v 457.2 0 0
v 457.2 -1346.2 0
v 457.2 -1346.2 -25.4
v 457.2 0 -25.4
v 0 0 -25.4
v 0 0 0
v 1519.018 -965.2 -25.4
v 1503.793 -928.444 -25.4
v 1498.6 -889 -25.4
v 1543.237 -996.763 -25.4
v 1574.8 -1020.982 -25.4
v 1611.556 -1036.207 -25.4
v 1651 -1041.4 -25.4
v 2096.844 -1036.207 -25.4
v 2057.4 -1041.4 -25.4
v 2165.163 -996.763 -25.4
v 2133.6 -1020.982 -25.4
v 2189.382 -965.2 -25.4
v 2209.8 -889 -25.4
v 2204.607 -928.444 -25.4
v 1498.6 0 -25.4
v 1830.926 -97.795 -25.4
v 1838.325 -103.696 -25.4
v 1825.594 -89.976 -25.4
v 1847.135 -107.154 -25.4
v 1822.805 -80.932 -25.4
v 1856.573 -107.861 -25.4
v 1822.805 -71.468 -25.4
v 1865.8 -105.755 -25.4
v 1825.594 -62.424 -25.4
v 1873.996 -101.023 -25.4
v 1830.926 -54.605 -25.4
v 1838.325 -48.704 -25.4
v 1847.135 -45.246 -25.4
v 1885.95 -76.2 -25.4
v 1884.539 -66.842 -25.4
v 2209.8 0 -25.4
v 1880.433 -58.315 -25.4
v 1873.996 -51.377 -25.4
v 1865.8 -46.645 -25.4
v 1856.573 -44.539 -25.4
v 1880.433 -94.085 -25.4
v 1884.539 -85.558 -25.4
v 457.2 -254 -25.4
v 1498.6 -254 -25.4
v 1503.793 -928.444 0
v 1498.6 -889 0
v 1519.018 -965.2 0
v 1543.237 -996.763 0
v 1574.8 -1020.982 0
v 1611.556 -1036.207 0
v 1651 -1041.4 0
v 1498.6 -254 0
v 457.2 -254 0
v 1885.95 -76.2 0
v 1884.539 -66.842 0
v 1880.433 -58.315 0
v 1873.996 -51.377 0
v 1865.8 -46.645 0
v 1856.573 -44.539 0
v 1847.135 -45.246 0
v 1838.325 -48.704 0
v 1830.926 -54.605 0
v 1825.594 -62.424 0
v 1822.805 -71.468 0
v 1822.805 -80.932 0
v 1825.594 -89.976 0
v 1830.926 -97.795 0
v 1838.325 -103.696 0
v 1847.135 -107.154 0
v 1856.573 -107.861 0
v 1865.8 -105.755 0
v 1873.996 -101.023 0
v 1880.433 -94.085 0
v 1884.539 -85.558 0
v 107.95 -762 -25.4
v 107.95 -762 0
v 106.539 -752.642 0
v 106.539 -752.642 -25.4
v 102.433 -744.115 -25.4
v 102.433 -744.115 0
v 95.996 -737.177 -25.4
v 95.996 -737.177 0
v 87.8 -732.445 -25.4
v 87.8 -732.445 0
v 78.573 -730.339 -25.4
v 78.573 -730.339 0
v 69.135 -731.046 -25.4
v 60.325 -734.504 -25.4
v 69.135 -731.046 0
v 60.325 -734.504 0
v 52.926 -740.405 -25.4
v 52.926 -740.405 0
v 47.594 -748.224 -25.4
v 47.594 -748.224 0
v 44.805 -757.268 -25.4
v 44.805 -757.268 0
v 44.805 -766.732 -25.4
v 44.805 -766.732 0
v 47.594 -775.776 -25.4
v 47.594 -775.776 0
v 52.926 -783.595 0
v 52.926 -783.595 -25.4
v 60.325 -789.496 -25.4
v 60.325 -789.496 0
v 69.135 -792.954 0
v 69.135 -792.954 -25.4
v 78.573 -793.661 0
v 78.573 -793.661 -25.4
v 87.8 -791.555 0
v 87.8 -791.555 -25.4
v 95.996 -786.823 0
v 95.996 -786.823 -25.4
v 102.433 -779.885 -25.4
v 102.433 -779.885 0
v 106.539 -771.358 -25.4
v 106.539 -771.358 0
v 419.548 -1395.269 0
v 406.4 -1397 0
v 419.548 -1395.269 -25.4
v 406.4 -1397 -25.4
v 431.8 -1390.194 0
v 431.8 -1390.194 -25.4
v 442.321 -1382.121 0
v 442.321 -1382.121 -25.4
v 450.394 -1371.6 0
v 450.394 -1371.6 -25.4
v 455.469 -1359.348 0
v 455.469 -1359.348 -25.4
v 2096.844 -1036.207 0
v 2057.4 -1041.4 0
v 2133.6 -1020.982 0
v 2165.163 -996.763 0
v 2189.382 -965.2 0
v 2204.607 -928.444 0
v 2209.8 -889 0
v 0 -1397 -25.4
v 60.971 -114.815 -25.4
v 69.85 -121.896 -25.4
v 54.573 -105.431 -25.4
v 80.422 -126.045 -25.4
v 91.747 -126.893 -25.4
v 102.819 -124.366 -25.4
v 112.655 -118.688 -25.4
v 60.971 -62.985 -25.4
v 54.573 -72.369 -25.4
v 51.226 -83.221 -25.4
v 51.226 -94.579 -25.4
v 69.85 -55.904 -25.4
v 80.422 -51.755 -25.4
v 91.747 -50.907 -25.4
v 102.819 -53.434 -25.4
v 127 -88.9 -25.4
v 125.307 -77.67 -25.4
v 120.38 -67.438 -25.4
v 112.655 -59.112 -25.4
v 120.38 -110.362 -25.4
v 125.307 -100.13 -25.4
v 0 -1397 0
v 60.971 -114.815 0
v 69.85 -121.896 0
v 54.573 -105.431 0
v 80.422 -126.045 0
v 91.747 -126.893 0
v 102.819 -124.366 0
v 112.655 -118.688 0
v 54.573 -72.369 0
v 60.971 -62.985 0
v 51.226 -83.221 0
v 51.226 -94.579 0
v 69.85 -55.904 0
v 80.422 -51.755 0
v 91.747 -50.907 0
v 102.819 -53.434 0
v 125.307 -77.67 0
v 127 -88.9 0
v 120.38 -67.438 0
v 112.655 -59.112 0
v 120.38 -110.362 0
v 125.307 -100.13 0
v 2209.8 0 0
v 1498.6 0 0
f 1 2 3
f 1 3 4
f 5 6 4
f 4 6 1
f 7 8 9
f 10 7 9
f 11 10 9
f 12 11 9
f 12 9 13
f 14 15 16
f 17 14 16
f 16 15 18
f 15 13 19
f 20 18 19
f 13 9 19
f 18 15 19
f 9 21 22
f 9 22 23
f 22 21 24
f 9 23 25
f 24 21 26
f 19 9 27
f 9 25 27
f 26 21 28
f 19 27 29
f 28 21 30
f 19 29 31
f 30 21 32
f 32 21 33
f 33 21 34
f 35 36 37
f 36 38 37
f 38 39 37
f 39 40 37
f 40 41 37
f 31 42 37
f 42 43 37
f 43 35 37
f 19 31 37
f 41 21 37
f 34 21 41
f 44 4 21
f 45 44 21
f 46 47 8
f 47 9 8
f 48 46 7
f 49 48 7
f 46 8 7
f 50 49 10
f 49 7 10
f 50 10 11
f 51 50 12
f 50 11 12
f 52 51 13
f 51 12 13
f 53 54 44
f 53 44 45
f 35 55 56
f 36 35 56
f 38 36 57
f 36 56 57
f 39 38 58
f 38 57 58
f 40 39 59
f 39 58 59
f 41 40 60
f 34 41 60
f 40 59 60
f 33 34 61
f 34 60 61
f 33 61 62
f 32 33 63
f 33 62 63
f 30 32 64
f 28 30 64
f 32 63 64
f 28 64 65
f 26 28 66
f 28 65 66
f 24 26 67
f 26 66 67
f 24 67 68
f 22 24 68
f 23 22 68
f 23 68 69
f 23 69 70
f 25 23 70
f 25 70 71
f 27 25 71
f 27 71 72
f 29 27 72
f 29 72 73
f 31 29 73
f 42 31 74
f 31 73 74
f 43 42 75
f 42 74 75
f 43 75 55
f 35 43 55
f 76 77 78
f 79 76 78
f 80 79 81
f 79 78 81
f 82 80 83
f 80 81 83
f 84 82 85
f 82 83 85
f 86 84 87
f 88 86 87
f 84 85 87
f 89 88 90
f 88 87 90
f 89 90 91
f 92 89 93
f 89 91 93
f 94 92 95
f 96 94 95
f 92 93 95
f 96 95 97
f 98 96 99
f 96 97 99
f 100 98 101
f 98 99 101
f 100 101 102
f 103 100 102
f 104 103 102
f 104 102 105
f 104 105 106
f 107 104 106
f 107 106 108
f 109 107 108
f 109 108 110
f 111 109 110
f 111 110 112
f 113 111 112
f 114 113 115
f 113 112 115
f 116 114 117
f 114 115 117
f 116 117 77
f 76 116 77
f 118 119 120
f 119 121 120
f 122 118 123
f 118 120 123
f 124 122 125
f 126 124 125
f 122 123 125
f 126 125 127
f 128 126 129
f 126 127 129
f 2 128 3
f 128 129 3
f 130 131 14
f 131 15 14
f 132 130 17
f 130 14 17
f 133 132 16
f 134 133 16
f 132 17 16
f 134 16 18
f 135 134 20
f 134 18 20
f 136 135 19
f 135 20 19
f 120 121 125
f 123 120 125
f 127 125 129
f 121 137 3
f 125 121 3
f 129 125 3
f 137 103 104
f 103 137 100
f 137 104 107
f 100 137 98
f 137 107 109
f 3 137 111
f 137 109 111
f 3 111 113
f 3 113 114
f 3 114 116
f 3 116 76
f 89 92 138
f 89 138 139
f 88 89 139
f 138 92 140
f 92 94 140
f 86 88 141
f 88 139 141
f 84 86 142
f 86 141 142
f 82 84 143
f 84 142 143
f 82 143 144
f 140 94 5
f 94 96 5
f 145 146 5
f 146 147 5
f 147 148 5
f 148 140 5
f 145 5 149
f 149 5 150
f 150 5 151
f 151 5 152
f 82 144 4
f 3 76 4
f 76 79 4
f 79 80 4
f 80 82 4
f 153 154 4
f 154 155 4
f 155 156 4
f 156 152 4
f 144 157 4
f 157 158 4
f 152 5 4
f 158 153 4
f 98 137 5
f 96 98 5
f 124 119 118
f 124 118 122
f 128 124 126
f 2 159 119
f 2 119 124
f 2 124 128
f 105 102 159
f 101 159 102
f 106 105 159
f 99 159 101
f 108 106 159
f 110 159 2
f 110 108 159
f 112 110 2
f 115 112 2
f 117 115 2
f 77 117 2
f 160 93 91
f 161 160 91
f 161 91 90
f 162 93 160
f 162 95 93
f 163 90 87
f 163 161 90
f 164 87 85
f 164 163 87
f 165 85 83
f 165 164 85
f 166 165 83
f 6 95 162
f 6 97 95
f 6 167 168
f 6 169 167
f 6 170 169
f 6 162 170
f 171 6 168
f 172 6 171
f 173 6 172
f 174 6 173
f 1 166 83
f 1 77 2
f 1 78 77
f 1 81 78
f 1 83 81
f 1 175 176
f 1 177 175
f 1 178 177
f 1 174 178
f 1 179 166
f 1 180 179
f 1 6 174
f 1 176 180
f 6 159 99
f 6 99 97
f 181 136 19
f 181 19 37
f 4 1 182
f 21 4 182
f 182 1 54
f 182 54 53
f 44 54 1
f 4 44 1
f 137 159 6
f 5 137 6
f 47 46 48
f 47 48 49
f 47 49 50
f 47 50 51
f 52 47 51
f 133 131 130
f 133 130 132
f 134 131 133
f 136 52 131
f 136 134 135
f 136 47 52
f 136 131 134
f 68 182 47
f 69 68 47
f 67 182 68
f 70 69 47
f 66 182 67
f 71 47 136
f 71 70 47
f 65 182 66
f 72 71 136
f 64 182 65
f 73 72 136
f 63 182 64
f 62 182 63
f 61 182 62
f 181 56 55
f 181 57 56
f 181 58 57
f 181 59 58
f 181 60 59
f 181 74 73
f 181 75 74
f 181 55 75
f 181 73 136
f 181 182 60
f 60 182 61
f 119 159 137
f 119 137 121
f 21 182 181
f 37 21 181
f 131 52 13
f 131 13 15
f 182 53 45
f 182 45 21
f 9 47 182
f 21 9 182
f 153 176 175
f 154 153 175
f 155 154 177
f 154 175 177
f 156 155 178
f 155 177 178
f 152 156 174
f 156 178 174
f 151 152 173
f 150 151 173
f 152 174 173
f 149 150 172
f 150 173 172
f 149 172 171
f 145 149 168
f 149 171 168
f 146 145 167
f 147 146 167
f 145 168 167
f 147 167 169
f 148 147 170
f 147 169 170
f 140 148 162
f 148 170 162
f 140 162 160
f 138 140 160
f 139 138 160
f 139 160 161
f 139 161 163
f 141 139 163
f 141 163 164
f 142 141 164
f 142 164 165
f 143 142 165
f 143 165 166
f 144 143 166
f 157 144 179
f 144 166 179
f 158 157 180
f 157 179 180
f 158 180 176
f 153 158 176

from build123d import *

# Parameters (mm, degrees)
F0_W     = 457.2
F0_H     = 1397
F1_DEPTH = 25.4
F2_W     = 1041.4
F2_H     = 254
F3_DEPTH = 25.4
F4_W     = 711.2
F4_H     = 1041.4
F5_DEPTH = 25.4
F6_R     = 50.8
F7_R     = 152.4
F8_R     = 38.1
F8_R_2   = 31.75
F9_DEPTH = 25.4


with BuildPart() as f1:
    # F0 (on Top) → F1 (new body)
    with BuildSketch(Plane.XY):
        with Locations((228.6, -698.5)):
            Rectangle(F0_W, F0_H)
    extrude(amount=-F1_DEPTH)

    # F6
    f6_edges = [f1.edges().sort_by_distance(p)[0] for p in [
        (457.2, -1397, -12.7),
    ]]
    fillet(f6_edges, radius=F6_R)


with BuildPart() as f3:
    # F2 (on Top) → F3 (new body)
    with BuildSketch(Plane.XY):
        with Locations((977.9, -127)):
            Rectangle(F2_W, F2_H)
    extrude(amount=-F3_DEPTH)


with BuildPart() as f5:
    # F4 (on Top) → F5 (new body)
    with BuildSketch(Plane.XY):
        with Locations((1854.2, -520.7)):
            Rectangle(F4_W, F4_H)
    extrude(amount=-F5_DEPTH)

    # F7
    f7_edges = [f5.edges().sort_by_distance(p)[0] for p in [
        (2209.8, -1041.4, -12.7),
        (1498.6, -1041.4, -12.7),
    ]]
    fillet(f7_edges, radius=F7_R)


with BuildPart() as f9_tool:
    # F8 (on face) → F9 (new body)
    with BuildSketch(Plane.XY):
        with Locations((88.9, -88.9)):
            Circle(F8_R)
        with Locations((1854.2, -76.2)):
            Circle(F8_R_2)
        with Locations((76.2, -762)):
            Circle(F8_R_2)
    extrude(amount=-F9_DEPTH)


with BuildPart() as f1_1:
    add(f1.part)

    # F9: cut by f9_tool
    add(f9_tool.part, mode=Mode.SUBTRACT)


with BuildPart() as f5_1:
    add(f5.part)

    # F9: cut by f9_tool
    add(f9_tool.part, mode=Mode.SUBTRACT)


solid = Compound([f3.part, f1_1.part, f5_1.part])
